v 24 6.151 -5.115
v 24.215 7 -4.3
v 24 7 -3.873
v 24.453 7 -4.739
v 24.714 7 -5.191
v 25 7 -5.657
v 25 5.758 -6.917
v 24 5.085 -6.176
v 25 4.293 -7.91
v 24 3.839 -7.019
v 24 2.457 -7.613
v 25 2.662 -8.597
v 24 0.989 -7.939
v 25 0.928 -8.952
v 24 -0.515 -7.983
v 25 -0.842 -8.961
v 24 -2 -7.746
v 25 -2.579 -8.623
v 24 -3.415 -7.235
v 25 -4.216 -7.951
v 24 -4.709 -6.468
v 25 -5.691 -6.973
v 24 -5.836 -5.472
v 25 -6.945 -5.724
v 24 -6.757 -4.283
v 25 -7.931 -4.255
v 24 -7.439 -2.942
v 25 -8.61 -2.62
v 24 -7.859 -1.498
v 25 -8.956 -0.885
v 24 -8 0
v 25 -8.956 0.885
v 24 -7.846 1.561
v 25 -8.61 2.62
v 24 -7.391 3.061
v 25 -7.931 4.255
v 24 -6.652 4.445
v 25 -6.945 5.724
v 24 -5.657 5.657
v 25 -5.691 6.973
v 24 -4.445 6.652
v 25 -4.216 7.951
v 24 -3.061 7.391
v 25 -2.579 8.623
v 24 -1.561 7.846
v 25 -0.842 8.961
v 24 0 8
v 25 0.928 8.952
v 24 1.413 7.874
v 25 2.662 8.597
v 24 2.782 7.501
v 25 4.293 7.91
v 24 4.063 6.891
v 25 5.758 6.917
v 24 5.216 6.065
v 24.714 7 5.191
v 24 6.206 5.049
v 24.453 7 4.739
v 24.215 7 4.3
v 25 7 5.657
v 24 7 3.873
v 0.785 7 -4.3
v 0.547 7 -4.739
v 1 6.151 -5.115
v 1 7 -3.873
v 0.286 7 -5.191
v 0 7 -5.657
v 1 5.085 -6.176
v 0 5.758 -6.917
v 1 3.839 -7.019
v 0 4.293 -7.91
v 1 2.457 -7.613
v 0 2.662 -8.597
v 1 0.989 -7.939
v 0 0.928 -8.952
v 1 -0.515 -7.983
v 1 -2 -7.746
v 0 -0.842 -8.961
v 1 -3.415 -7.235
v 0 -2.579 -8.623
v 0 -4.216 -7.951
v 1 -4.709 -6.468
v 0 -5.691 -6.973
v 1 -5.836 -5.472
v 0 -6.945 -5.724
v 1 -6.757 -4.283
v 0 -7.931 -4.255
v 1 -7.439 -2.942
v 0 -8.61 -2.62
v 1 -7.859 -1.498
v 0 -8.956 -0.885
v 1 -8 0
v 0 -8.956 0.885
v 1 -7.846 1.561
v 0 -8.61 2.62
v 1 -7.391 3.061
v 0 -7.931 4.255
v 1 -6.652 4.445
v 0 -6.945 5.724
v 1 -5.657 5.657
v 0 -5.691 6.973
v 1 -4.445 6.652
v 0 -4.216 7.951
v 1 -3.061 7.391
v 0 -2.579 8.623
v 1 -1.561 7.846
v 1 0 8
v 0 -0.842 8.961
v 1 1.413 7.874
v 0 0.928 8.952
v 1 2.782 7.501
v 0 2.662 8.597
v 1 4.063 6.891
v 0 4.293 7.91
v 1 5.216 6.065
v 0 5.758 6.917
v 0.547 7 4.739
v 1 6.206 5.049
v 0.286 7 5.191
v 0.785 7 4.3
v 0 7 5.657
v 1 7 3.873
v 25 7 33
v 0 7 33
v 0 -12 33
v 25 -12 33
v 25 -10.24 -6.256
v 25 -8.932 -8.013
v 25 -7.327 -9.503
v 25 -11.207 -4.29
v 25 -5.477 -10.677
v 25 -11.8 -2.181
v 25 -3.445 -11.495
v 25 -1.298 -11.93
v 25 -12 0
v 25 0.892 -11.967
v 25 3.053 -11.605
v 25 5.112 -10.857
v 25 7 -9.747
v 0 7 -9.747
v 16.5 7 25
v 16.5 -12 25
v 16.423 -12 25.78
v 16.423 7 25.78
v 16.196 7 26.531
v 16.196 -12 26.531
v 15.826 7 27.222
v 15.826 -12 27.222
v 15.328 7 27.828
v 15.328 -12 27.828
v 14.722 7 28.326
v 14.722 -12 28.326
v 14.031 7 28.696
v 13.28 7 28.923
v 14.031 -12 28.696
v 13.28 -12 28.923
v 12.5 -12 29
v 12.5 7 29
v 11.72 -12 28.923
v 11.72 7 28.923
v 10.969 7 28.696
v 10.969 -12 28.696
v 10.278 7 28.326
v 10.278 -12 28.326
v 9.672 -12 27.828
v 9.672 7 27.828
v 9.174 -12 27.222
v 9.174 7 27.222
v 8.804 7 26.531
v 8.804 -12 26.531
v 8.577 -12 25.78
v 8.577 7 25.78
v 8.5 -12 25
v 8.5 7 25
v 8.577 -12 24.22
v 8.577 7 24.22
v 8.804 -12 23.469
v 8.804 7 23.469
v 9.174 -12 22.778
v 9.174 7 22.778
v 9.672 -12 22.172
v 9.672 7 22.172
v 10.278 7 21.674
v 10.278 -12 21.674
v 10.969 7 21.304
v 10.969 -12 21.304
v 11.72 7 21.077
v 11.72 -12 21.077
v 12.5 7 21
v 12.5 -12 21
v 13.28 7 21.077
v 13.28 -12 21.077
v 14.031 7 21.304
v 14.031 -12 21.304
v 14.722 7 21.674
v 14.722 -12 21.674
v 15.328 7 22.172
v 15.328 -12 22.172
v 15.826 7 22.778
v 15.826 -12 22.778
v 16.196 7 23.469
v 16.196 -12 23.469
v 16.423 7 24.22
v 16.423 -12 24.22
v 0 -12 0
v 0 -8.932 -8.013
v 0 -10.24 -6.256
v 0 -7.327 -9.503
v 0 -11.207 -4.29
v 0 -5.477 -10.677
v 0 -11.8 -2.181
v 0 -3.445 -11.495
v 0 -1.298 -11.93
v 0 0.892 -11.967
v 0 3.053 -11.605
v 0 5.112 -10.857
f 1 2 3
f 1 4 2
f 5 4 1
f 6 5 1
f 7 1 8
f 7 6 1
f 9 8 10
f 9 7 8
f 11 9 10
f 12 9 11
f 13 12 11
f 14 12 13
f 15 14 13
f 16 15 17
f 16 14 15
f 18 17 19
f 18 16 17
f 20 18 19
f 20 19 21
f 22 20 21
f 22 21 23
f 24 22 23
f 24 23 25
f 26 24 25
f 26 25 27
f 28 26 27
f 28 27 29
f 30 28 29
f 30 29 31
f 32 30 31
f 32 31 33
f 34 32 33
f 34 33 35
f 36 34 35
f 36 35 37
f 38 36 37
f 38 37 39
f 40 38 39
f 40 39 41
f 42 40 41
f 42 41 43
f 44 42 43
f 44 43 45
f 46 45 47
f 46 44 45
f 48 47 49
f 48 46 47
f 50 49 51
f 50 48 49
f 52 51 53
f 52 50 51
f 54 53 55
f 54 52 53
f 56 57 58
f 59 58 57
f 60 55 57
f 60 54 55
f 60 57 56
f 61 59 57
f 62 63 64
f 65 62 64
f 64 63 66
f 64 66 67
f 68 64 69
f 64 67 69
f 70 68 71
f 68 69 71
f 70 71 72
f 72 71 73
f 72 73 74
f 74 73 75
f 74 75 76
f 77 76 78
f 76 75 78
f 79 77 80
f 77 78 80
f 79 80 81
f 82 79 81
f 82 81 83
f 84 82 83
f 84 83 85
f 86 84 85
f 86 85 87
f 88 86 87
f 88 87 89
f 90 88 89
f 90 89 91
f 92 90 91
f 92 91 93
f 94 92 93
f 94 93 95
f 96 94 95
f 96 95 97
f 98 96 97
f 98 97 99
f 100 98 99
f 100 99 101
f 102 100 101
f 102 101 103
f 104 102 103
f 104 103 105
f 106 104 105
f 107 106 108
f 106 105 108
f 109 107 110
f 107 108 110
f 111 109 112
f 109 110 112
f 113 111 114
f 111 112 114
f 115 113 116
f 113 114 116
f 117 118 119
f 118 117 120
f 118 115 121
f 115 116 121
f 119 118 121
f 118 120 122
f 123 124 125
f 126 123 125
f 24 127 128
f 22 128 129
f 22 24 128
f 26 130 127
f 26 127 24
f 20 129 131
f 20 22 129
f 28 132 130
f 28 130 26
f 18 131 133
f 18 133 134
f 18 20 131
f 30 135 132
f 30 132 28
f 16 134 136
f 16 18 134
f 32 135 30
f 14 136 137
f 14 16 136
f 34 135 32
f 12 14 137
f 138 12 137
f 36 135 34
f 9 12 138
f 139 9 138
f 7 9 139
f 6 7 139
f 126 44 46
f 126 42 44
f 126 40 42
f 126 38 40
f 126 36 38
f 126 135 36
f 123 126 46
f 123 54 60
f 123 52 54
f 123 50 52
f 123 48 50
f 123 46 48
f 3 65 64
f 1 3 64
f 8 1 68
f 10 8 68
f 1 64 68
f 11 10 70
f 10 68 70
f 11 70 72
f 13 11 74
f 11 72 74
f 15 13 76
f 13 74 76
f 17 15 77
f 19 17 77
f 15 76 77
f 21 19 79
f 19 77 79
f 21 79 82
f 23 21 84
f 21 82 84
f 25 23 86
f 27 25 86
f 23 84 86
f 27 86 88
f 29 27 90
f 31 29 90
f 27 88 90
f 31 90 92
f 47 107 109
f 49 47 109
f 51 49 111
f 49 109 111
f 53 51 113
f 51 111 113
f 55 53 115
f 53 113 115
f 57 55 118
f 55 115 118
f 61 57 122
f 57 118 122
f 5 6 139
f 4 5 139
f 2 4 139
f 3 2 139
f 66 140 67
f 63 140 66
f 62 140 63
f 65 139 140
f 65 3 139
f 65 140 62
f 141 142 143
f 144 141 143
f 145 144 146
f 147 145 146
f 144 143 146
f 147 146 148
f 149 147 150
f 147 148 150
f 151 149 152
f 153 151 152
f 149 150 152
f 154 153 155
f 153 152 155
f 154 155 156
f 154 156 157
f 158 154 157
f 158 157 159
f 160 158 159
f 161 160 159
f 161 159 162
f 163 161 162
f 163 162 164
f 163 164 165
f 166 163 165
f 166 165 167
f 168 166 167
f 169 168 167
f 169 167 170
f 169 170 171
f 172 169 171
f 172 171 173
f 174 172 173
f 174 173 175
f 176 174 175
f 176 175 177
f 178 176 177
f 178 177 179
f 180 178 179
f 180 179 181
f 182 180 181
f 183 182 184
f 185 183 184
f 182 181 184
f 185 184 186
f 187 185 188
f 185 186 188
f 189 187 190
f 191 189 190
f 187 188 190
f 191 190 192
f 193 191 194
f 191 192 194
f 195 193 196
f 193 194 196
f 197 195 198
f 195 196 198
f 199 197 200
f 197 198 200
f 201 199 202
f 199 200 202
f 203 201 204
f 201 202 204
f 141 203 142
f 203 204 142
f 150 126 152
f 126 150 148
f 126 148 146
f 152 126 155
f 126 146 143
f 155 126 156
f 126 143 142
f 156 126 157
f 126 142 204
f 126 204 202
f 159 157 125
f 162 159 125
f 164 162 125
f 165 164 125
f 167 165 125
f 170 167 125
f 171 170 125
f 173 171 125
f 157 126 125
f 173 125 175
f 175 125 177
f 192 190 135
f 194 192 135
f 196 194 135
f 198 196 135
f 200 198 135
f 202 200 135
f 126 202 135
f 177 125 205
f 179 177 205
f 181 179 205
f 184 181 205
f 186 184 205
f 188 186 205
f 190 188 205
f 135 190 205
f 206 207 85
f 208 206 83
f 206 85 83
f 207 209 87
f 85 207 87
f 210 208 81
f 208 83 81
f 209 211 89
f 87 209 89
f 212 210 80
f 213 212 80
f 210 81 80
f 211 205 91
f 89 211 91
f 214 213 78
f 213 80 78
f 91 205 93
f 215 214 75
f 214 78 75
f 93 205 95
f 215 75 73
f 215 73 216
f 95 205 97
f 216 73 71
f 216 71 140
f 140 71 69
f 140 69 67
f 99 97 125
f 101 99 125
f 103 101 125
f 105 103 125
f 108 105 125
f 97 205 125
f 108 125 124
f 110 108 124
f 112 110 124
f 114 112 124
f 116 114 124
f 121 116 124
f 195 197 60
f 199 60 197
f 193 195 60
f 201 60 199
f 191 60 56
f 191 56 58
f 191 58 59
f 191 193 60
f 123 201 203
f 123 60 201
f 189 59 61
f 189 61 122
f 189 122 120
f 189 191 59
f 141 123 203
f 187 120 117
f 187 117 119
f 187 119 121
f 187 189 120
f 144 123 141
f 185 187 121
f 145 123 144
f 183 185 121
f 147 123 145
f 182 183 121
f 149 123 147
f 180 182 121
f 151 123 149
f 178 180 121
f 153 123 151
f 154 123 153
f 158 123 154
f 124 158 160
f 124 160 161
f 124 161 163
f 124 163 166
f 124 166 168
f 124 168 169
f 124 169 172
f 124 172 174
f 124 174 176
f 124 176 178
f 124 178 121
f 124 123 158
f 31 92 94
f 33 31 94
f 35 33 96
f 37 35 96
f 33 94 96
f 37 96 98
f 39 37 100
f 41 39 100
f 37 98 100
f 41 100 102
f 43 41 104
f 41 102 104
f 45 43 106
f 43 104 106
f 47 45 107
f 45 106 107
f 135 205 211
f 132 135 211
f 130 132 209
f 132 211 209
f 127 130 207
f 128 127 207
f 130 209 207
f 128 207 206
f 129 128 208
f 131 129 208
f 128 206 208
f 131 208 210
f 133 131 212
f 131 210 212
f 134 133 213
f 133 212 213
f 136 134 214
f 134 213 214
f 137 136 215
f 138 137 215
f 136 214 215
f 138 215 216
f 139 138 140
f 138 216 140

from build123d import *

# Parameters (mm, degrees)
F1_DEPTH = 25
F3_W     = 25
F3_H     = 33
F3_H_2   = 17
F4_DEPTH = 5
F6_DEPTH = 25


# Not quite as in the source:
# - a fillet or chamfer that OpenCascade refuses, or shapes differently, is made with other operations: its cross-section is extruded or revolved along the edge and cut away or added


with BuildPart() as f1:
    # F0 (on Right) → F1 (new body)
    with BuildSketch(Plane.YZ):
        with BuildLine():
            ThreePointArc((0, 8), (5.6568542495, 5.6568542495), (8, 0))
            Line((8, 0), (12, 0))
            ThreePointArc((12, 0), (8.4852813742, 8.4852813742), (0, 12))
            Line((0, 12), (0, 8))
        make_face()
        with BuildLine():
            Line((12, 0), (8, 0))
            ThreePointArc((8, 0), (0, -8), (-8, 0))
            Line((-8, 0), (-12, 0))
            ThreePointArc((-12, 0), (0, -12), (12, 0))
        make_face()
        with BuildLine():
            ThreePointArc((-8, 0), (-5.6568542495, 5.6568542495), (0, 8))
            Line((0, 8), (0, 12))
            ThreePointArc((0, 12), (-8.4852813742, 8.4852813742), (-12, 0))
            Line((-12, 0), (-8, 0))
        make_face()
        with BuildLine():
            ThreePointArc((-12, 0), (-8.4852813742, 8.4852813742), (0, 12))
            Line((0, 12), (0, 25))
            Line((0, 25), (0, 29))
            Line((0, 29), (0, 33))
            Line((0, 33), (-12, 33))
            Line((-12, 33), (-12, 0))
        make_face()
        with BuildLine():
            ThreePointArc((0, 12), (8.4852813742, 8.4852813742), (12, 0))
            Line((12, 0), (12, 33))
            Line((12, 33), (0, 33))
            Line((0, 33), (0, 29))
            Line((0, 29), (0, 25))
            Line((0, 25), (0, 12))
        make_face()
    extrude(amount=F1_DEPTH)

    # F2: chamfer of 1 on 2 edges, made by hand

    # F2_s1 → F2_t2 (revolve, cut)
    with BuildSketch(Plane.XY):
        Polygon((24, -8), (25, -9), (25, -8), align=None)
    revolve(axis=Axis((25, 0, 0), (-1, 0, 0)), mode=Mode.SUBTRACT)

    # F2_s3 → F2_t4 (revolve, cut)
    with BuildSketch(Plane.XY):
        Polygon((1, -8), (0, -9), (0, -8), align=None)
    revolve(axis=Axis((0, 0, 0), (-1, 0, 0)), mode=Mode.SUBTRACT)

    # F3 (on face) → F4 (cut)
    with BuildSketch(Plane(origin=(0, 12, 0), x_dir=(-1, 0, 0), z_dir=(0, 1, 0))):
        with Locations((-12.5, 16.5)):
            Rectangle(F3_W, F3_H)
        with Locations((-12.5, -8.5)):
            Rectangle(F3_W, F3_H_2)
    extrude(amount=-F4_DEPTH, mode=Mode.SUBTRACT)

    # F5 (on face) → F6 (cut)
    with BuildSketch(Plane.XZ.offset(12)):
        with BuildLine():
            Line((12.5, 25), (8.5, 25))
            ThreePointArc((8.5, 25), (12.5, 21), (16.5, 25))
            Line((16.5, 25), (12.5, 25))
        make_face()
        with BuildLine():
            ThreePointArc((16.5, 25), (12.5, 29), (8.5, 25))
            Line((8.5, 25), (12.5, 25))
            Line((12.5, 25), (16.5, 25))
        make_face()
    extrude(amount=-F6_DEPTH, mode=Mode.SUBTRACT)


solid = f1.part
